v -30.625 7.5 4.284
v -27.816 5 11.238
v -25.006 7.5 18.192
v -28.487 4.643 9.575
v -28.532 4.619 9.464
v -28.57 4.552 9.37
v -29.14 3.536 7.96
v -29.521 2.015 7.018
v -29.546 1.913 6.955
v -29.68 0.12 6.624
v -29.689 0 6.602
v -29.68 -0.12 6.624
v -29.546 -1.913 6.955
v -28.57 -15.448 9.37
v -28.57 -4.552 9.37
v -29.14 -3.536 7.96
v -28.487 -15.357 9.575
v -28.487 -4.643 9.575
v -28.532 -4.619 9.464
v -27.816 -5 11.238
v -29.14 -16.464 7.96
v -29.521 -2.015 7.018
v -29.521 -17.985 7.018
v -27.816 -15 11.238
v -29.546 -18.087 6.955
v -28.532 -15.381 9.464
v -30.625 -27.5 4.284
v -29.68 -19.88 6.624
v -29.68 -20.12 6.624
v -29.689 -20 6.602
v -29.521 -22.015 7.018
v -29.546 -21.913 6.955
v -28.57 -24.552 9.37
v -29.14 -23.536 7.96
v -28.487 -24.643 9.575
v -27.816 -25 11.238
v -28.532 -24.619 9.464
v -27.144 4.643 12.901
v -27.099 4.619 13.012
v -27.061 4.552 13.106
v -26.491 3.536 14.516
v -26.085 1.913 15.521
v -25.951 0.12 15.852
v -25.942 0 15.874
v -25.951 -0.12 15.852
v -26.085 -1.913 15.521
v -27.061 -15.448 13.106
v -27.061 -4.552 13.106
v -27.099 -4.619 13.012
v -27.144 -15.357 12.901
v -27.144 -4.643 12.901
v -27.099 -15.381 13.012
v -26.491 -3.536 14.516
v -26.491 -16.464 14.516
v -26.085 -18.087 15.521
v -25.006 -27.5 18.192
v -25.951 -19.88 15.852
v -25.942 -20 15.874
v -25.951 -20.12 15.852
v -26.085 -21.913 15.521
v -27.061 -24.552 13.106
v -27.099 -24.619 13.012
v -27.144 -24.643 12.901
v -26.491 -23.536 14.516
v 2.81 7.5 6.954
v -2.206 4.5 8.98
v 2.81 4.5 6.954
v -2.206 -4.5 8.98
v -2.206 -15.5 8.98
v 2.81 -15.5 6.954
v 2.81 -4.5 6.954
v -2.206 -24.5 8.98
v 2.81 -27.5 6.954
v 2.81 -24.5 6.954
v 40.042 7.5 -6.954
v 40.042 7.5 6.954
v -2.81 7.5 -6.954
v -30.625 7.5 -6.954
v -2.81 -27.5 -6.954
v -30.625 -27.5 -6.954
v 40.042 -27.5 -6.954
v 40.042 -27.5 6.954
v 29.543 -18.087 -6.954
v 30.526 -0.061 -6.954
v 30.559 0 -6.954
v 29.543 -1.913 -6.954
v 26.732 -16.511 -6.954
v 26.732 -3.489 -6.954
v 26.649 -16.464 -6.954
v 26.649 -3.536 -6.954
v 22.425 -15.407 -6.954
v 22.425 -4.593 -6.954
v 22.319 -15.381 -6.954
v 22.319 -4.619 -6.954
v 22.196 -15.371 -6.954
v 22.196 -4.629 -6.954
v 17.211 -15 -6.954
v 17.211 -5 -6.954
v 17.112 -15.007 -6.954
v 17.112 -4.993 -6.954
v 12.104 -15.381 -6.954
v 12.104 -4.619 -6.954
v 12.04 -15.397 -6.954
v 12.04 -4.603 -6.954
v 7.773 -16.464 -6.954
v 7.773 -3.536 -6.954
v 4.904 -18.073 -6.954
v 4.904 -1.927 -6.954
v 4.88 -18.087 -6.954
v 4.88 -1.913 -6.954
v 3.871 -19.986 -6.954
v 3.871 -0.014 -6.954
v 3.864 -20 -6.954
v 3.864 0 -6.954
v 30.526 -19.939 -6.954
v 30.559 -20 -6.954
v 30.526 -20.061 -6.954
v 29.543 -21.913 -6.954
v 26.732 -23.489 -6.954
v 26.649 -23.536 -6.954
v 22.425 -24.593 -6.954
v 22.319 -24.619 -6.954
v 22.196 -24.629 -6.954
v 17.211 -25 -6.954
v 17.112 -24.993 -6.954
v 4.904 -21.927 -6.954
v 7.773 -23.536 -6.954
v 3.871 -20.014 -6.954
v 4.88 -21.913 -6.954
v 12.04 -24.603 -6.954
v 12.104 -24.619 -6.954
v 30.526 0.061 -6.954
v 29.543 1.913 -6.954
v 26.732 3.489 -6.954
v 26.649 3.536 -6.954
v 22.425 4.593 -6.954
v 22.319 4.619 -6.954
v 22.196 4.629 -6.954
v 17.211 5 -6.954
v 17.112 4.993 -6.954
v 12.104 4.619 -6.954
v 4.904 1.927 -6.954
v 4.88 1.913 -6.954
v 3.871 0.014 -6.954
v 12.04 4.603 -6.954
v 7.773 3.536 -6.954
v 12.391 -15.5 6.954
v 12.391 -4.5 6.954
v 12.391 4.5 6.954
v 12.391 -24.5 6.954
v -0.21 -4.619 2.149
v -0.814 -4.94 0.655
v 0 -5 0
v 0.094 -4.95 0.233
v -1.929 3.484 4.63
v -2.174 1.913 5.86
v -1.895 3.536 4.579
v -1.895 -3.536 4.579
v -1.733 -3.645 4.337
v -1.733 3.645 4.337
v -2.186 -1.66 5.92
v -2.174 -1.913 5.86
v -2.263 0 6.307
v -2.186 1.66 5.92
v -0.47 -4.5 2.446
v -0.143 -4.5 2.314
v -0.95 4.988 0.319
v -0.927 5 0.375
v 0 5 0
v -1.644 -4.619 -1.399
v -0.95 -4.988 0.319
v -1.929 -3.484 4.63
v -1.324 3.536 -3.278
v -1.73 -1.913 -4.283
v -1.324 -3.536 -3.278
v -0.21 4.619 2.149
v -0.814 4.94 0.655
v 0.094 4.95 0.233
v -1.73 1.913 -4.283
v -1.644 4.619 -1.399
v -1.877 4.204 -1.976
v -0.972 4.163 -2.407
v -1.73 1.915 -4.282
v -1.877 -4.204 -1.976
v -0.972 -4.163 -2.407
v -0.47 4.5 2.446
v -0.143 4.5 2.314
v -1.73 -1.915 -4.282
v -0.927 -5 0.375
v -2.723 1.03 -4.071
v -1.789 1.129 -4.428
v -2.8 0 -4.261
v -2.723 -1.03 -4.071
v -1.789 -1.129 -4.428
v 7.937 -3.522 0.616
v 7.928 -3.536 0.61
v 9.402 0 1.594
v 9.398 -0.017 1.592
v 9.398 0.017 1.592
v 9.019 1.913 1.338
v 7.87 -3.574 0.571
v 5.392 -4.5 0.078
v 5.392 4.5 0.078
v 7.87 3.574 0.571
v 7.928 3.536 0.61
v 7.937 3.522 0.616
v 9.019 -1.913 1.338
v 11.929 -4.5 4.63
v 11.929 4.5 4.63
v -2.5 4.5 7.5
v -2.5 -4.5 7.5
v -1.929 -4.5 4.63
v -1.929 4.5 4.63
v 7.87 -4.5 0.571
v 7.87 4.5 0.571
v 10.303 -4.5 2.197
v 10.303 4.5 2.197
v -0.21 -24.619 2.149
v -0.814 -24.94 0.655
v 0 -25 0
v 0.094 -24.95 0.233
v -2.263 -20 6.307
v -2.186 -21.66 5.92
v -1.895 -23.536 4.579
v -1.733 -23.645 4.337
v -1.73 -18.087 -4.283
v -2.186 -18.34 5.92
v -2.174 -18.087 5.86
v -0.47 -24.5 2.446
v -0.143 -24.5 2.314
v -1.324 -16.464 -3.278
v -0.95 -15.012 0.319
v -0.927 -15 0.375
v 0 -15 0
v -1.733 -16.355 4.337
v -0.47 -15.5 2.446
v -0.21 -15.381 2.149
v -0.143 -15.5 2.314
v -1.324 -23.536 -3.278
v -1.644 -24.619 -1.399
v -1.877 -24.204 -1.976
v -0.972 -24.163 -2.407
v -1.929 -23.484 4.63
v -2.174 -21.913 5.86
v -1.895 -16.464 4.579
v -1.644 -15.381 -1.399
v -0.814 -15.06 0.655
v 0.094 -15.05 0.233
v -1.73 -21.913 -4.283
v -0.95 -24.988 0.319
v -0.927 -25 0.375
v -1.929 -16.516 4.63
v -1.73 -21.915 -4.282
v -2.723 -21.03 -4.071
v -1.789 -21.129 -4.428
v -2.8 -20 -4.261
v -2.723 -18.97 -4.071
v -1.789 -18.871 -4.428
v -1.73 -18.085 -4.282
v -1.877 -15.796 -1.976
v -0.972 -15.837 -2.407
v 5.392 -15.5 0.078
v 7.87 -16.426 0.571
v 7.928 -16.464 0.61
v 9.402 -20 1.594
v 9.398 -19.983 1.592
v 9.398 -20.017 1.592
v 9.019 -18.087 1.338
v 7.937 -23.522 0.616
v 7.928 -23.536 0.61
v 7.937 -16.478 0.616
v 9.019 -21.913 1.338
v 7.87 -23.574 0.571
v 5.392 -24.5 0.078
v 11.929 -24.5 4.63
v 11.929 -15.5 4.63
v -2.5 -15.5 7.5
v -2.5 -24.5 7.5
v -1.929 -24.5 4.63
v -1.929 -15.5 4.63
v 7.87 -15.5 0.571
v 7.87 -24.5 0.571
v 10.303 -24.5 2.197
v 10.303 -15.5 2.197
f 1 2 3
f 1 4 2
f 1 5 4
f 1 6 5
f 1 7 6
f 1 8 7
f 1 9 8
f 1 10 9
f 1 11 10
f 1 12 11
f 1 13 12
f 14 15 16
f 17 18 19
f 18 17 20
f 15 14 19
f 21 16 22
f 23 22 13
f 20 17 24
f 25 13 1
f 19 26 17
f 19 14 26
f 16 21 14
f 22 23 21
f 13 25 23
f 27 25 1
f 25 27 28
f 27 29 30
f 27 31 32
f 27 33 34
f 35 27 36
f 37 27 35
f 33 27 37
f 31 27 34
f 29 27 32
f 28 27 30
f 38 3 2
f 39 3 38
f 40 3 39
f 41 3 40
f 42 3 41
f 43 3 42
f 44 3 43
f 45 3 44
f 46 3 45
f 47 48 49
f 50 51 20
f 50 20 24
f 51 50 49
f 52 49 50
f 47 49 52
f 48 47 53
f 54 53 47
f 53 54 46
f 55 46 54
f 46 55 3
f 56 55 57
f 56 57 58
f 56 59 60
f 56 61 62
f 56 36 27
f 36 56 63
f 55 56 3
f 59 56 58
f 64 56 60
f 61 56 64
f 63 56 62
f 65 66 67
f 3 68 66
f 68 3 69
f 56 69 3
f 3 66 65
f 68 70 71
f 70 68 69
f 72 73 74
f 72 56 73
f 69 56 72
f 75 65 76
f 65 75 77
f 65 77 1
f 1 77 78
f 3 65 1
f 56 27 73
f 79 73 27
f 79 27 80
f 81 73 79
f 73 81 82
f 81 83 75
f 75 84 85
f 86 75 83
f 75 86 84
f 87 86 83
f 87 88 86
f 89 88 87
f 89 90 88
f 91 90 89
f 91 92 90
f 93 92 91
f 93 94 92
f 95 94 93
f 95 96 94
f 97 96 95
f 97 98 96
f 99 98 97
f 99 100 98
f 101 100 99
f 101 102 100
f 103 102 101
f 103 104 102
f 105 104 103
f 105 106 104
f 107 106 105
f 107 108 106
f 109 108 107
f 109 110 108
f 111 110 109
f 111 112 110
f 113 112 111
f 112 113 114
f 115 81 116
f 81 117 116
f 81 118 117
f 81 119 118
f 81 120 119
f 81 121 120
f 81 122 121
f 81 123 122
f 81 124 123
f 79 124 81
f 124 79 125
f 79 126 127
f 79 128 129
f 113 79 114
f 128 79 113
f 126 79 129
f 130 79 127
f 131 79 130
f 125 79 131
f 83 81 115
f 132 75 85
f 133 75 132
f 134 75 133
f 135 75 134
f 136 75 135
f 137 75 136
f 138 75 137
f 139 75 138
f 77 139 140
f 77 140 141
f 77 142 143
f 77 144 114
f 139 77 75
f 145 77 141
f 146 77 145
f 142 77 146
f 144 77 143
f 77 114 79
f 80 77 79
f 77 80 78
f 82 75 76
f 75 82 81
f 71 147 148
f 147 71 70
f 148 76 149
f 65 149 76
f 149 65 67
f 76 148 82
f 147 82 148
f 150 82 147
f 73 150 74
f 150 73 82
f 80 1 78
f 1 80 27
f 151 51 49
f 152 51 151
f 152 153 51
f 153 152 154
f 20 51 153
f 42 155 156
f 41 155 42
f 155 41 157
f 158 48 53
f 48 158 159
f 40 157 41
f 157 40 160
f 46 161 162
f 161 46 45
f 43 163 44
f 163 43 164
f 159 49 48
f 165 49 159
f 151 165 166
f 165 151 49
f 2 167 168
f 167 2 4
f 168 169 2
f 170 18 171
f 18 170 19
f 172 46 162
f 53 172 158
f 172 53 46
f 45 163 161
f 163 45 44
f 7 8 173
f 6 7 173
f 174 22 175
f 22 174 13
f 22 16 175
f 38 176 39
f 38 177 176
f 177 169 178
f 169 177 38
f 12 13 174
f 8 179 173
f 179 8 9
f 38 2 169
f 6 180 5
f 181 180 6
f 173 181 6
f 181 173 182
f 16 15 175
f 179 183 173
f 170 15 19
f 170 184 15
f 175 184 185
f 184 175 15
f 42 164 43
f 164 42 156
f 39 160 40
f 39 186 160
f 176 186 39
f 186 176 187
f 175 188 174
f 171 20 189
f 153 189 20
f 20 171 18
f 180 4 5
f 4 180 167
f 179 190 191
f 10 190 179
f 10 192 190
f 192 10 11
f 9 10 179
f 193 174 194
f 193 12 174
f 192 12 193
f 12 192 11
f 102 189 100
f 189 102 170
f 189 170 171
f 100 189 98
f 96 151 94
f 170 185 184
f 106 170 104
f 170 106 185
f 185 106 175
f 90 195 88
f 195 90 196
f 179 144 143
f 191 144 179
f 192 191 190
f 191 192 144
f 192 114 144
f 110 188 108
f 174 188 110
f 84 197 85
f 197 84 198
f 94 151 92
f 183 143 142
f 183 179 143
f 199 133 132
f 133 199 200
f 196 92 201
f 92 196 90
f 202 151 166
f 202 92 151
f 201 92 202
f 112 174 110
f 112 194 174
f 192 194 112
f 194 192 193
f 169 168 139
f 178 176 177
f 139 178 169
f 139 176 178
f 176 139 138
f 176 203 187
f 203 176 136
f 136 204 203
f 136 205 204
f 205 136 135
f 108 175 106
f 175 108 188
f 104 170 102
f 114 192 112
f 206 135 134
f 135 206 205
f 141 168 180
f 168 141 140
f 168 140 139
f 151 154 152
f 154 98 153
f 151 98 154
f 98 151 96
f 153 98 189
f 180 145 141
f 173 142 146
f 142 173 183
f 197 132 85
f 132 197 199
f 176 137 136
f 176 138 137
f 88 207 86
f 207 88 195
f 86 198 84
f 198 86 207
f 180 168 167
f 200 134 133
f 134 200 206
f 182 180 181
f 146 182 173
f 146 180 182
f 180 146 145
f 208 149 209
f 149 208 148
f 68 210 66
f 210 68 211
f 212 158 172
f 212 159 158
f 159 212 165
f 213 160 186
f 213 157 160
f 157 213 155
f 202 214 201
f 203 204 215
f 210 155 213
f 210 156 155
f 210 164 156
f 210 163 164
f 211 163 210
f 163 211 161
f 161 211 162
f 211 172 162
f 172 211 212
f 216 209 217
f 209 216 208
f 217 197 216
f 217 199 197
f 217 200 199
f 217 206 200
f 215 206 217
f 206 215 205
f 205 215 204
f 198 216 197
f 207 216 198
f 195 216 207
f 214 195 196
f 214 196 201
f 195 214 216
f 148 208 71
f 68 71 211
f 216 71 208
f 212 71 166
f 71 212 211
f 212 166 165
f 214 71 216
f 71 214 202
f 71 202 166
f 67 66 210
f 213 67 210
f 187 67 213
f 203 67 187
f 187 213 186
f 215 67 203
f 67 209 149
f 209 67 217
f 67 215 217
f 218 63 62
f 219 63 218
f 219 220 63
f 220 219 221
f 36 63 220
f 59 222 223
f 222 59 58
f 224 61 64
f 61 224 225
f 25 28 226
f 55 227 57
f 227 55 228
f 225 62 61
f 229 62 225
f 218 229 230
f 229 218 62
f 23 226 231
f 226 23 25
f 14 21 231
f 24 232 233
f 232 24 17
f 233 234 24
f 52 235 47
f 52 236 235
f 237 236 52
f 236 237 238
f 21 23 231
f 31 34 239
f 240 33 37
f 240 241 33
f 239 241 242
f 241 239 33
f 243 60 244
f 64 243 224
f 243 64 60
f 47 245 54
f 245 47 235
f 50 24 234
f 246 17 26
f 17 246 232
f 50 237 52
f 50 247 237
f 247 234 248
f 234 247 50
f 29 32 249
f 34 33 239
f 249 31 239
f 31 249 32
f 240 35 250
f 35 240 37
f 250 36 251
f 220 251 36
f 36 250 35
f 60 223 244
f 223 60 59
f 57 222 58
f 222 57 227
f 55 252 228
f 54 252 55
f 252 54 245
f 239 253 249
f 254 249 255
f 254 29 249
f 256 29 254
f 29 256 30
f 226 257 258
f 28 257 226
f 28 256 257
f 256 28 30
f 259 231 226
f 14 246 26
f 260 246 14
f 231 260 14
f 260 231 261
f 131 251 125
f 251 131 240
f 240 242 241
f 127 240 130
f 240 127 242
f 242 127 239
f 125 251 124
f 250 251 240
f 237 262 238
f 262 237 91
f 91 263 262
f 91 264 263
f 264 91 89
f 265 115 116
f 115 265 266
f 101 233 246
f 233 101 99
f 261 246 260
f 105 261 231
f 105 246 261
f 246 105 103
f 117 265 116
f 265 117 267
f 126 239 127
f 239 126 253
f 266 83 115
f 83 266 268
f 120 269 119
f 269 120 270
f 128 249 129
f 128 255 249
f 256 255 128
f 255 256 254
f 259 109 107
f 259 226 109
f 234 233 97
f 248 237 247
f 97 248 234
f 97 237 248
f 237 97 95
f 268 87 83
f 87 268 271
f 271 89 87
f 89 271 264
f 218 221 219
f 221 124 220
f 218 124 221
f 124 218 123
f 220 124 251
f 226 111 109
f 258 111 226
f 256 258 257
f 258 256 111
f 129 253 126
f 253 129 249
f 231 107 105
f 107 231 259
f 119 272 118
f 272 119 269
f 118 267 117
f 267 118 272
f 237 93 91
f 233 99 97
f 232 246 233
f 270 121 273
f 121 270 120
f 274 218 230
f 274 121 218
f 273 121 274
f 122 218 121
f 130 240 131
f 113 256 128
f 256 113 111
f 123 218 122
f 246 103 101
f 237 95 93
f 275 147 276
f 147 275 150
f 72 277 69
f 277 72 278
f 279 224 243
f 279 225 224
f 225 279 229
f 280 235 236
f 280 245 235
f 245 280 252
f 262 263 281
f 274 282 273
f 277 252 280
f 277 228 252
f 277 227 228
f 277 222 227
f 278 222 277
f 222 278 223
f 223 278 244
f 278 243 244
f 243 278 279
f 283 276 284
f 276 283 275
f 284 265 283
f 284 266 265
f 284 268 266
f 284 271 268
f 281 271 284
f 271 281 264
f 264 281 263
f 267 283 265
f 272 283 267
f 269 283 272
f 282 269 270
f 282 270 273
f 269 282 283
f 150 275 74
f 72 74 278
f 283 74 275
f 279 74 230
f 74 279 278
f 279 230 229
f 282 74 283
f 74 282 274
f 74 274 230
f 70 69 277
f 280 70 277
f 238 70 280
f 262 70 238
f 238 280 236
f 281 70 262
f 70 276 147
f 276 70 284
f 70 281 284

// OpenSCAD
/* * * * * * * * * * * * * * * * * * * * * * * * * * * * * * * * * * * * * * * *\
|* Parameterized Pocket Hole Jig                                               *|
|* Created By:  Corey Abate (@SpoonlessCorey)                                  *|
|* Last updated: 13APR2016                                                     *|
|*                                                                             *| 
|* This work is licensed under:                                                *|
|* Creative Commons Attribution-ShareAlike 4.0 International License           *|
|*                                                                             *|
|* To view a copy of this license, visit                                       *|
|* http://creativecommons.org/licenses/by-sa/4.0/.                             *|
|*                                                                             *| 
\* * * * * * * * * * * * * * * * * * * * * * * * * * * * * * * * * * * * * * * */

//Tweakables
//================================================

//Hole angle in degrees
holeAngle     = 22;

//Hole diameter in mm
holeSize      = 10;

//Hole depth in mm
holeDepth     = 30;

//Number of holes
numberOfHoles = 2;

//Center-to-center hole spacing
holeSpacing   = 20;   //mm (center to center)

//thickness around holes as a percent of holeSize
edgeSpacing   = 25;



//Some math and stuff
//================================================
edge         = edgeSpacing/100;
width        = (numberOfHoles - 1)*holeSpacing + holeSize + 2*edge*holeSize;
offsetWidth  = -edge*holeSize - holeSize/2;
guideHeight  = (1+2*edge)*holeSize;
baseHeight   = holeDepth*sin(holeAngle)-guideHeight*cos(holeAngle)/2;
baseLength   = guideHeight*sin(holeAngle) + holeDepth*cos(holeAngle)-((guideHeight/2)*sin(holeAngle)); 
baseOffsetV  = -guideHeight*cos(holeAngle)/2;
gripLength   = guideHeight/sin(holeAngle);
gripHeight   = guideHeight*cos(holeAngle);

//Creating the parts
//================================================
rotate([0,0,180])
difference(){
 

    //Block Geometry
    union(){

        //Guide Geometry
        rotate([90-holeAngle,0,90])
            translate([offsetWidth, offsetWidth, 0])
                cube([width,guideHeight,holeDepth]);
 
        //Base Geometry
        rotate([270,0,0])
            translate([0,0,offsetWidth])       
                linear_extrude(height = width)
                    polygon( points=[[0,-gripHeight/2],
                                    [baseLength,-baseHeight],
                                    [baseLength,-baseOffsetV],
                                    [-gripLength,-baseOffsetV],
                                    [-gripLength,-gripHeight/2]] );

    }

    //Hole Geometry
    for( i = [0: numberOfHoles-1]){

        rotate([90-holeAngle ,0,90])
            translate([i*holeSpacing,0,0])
                cylinder(r=holeSize/2,h=holeDepth+2 ,$fn=16);

        rotate([270-holeAngle ,0,90])
            translate([i*holeSpacing,0,-1])
                cylinder(r=holeSize/2,h=1000 ,$fn=16);
        
        translate([-holeSize/2,i*holeSpacing,holeSize*3/4])
            rotate([90,0,0])
                cylinder(r=holeSize*3/4,h=holeSize*0.9 ,$fn=16, center = true);

    }

   

}
